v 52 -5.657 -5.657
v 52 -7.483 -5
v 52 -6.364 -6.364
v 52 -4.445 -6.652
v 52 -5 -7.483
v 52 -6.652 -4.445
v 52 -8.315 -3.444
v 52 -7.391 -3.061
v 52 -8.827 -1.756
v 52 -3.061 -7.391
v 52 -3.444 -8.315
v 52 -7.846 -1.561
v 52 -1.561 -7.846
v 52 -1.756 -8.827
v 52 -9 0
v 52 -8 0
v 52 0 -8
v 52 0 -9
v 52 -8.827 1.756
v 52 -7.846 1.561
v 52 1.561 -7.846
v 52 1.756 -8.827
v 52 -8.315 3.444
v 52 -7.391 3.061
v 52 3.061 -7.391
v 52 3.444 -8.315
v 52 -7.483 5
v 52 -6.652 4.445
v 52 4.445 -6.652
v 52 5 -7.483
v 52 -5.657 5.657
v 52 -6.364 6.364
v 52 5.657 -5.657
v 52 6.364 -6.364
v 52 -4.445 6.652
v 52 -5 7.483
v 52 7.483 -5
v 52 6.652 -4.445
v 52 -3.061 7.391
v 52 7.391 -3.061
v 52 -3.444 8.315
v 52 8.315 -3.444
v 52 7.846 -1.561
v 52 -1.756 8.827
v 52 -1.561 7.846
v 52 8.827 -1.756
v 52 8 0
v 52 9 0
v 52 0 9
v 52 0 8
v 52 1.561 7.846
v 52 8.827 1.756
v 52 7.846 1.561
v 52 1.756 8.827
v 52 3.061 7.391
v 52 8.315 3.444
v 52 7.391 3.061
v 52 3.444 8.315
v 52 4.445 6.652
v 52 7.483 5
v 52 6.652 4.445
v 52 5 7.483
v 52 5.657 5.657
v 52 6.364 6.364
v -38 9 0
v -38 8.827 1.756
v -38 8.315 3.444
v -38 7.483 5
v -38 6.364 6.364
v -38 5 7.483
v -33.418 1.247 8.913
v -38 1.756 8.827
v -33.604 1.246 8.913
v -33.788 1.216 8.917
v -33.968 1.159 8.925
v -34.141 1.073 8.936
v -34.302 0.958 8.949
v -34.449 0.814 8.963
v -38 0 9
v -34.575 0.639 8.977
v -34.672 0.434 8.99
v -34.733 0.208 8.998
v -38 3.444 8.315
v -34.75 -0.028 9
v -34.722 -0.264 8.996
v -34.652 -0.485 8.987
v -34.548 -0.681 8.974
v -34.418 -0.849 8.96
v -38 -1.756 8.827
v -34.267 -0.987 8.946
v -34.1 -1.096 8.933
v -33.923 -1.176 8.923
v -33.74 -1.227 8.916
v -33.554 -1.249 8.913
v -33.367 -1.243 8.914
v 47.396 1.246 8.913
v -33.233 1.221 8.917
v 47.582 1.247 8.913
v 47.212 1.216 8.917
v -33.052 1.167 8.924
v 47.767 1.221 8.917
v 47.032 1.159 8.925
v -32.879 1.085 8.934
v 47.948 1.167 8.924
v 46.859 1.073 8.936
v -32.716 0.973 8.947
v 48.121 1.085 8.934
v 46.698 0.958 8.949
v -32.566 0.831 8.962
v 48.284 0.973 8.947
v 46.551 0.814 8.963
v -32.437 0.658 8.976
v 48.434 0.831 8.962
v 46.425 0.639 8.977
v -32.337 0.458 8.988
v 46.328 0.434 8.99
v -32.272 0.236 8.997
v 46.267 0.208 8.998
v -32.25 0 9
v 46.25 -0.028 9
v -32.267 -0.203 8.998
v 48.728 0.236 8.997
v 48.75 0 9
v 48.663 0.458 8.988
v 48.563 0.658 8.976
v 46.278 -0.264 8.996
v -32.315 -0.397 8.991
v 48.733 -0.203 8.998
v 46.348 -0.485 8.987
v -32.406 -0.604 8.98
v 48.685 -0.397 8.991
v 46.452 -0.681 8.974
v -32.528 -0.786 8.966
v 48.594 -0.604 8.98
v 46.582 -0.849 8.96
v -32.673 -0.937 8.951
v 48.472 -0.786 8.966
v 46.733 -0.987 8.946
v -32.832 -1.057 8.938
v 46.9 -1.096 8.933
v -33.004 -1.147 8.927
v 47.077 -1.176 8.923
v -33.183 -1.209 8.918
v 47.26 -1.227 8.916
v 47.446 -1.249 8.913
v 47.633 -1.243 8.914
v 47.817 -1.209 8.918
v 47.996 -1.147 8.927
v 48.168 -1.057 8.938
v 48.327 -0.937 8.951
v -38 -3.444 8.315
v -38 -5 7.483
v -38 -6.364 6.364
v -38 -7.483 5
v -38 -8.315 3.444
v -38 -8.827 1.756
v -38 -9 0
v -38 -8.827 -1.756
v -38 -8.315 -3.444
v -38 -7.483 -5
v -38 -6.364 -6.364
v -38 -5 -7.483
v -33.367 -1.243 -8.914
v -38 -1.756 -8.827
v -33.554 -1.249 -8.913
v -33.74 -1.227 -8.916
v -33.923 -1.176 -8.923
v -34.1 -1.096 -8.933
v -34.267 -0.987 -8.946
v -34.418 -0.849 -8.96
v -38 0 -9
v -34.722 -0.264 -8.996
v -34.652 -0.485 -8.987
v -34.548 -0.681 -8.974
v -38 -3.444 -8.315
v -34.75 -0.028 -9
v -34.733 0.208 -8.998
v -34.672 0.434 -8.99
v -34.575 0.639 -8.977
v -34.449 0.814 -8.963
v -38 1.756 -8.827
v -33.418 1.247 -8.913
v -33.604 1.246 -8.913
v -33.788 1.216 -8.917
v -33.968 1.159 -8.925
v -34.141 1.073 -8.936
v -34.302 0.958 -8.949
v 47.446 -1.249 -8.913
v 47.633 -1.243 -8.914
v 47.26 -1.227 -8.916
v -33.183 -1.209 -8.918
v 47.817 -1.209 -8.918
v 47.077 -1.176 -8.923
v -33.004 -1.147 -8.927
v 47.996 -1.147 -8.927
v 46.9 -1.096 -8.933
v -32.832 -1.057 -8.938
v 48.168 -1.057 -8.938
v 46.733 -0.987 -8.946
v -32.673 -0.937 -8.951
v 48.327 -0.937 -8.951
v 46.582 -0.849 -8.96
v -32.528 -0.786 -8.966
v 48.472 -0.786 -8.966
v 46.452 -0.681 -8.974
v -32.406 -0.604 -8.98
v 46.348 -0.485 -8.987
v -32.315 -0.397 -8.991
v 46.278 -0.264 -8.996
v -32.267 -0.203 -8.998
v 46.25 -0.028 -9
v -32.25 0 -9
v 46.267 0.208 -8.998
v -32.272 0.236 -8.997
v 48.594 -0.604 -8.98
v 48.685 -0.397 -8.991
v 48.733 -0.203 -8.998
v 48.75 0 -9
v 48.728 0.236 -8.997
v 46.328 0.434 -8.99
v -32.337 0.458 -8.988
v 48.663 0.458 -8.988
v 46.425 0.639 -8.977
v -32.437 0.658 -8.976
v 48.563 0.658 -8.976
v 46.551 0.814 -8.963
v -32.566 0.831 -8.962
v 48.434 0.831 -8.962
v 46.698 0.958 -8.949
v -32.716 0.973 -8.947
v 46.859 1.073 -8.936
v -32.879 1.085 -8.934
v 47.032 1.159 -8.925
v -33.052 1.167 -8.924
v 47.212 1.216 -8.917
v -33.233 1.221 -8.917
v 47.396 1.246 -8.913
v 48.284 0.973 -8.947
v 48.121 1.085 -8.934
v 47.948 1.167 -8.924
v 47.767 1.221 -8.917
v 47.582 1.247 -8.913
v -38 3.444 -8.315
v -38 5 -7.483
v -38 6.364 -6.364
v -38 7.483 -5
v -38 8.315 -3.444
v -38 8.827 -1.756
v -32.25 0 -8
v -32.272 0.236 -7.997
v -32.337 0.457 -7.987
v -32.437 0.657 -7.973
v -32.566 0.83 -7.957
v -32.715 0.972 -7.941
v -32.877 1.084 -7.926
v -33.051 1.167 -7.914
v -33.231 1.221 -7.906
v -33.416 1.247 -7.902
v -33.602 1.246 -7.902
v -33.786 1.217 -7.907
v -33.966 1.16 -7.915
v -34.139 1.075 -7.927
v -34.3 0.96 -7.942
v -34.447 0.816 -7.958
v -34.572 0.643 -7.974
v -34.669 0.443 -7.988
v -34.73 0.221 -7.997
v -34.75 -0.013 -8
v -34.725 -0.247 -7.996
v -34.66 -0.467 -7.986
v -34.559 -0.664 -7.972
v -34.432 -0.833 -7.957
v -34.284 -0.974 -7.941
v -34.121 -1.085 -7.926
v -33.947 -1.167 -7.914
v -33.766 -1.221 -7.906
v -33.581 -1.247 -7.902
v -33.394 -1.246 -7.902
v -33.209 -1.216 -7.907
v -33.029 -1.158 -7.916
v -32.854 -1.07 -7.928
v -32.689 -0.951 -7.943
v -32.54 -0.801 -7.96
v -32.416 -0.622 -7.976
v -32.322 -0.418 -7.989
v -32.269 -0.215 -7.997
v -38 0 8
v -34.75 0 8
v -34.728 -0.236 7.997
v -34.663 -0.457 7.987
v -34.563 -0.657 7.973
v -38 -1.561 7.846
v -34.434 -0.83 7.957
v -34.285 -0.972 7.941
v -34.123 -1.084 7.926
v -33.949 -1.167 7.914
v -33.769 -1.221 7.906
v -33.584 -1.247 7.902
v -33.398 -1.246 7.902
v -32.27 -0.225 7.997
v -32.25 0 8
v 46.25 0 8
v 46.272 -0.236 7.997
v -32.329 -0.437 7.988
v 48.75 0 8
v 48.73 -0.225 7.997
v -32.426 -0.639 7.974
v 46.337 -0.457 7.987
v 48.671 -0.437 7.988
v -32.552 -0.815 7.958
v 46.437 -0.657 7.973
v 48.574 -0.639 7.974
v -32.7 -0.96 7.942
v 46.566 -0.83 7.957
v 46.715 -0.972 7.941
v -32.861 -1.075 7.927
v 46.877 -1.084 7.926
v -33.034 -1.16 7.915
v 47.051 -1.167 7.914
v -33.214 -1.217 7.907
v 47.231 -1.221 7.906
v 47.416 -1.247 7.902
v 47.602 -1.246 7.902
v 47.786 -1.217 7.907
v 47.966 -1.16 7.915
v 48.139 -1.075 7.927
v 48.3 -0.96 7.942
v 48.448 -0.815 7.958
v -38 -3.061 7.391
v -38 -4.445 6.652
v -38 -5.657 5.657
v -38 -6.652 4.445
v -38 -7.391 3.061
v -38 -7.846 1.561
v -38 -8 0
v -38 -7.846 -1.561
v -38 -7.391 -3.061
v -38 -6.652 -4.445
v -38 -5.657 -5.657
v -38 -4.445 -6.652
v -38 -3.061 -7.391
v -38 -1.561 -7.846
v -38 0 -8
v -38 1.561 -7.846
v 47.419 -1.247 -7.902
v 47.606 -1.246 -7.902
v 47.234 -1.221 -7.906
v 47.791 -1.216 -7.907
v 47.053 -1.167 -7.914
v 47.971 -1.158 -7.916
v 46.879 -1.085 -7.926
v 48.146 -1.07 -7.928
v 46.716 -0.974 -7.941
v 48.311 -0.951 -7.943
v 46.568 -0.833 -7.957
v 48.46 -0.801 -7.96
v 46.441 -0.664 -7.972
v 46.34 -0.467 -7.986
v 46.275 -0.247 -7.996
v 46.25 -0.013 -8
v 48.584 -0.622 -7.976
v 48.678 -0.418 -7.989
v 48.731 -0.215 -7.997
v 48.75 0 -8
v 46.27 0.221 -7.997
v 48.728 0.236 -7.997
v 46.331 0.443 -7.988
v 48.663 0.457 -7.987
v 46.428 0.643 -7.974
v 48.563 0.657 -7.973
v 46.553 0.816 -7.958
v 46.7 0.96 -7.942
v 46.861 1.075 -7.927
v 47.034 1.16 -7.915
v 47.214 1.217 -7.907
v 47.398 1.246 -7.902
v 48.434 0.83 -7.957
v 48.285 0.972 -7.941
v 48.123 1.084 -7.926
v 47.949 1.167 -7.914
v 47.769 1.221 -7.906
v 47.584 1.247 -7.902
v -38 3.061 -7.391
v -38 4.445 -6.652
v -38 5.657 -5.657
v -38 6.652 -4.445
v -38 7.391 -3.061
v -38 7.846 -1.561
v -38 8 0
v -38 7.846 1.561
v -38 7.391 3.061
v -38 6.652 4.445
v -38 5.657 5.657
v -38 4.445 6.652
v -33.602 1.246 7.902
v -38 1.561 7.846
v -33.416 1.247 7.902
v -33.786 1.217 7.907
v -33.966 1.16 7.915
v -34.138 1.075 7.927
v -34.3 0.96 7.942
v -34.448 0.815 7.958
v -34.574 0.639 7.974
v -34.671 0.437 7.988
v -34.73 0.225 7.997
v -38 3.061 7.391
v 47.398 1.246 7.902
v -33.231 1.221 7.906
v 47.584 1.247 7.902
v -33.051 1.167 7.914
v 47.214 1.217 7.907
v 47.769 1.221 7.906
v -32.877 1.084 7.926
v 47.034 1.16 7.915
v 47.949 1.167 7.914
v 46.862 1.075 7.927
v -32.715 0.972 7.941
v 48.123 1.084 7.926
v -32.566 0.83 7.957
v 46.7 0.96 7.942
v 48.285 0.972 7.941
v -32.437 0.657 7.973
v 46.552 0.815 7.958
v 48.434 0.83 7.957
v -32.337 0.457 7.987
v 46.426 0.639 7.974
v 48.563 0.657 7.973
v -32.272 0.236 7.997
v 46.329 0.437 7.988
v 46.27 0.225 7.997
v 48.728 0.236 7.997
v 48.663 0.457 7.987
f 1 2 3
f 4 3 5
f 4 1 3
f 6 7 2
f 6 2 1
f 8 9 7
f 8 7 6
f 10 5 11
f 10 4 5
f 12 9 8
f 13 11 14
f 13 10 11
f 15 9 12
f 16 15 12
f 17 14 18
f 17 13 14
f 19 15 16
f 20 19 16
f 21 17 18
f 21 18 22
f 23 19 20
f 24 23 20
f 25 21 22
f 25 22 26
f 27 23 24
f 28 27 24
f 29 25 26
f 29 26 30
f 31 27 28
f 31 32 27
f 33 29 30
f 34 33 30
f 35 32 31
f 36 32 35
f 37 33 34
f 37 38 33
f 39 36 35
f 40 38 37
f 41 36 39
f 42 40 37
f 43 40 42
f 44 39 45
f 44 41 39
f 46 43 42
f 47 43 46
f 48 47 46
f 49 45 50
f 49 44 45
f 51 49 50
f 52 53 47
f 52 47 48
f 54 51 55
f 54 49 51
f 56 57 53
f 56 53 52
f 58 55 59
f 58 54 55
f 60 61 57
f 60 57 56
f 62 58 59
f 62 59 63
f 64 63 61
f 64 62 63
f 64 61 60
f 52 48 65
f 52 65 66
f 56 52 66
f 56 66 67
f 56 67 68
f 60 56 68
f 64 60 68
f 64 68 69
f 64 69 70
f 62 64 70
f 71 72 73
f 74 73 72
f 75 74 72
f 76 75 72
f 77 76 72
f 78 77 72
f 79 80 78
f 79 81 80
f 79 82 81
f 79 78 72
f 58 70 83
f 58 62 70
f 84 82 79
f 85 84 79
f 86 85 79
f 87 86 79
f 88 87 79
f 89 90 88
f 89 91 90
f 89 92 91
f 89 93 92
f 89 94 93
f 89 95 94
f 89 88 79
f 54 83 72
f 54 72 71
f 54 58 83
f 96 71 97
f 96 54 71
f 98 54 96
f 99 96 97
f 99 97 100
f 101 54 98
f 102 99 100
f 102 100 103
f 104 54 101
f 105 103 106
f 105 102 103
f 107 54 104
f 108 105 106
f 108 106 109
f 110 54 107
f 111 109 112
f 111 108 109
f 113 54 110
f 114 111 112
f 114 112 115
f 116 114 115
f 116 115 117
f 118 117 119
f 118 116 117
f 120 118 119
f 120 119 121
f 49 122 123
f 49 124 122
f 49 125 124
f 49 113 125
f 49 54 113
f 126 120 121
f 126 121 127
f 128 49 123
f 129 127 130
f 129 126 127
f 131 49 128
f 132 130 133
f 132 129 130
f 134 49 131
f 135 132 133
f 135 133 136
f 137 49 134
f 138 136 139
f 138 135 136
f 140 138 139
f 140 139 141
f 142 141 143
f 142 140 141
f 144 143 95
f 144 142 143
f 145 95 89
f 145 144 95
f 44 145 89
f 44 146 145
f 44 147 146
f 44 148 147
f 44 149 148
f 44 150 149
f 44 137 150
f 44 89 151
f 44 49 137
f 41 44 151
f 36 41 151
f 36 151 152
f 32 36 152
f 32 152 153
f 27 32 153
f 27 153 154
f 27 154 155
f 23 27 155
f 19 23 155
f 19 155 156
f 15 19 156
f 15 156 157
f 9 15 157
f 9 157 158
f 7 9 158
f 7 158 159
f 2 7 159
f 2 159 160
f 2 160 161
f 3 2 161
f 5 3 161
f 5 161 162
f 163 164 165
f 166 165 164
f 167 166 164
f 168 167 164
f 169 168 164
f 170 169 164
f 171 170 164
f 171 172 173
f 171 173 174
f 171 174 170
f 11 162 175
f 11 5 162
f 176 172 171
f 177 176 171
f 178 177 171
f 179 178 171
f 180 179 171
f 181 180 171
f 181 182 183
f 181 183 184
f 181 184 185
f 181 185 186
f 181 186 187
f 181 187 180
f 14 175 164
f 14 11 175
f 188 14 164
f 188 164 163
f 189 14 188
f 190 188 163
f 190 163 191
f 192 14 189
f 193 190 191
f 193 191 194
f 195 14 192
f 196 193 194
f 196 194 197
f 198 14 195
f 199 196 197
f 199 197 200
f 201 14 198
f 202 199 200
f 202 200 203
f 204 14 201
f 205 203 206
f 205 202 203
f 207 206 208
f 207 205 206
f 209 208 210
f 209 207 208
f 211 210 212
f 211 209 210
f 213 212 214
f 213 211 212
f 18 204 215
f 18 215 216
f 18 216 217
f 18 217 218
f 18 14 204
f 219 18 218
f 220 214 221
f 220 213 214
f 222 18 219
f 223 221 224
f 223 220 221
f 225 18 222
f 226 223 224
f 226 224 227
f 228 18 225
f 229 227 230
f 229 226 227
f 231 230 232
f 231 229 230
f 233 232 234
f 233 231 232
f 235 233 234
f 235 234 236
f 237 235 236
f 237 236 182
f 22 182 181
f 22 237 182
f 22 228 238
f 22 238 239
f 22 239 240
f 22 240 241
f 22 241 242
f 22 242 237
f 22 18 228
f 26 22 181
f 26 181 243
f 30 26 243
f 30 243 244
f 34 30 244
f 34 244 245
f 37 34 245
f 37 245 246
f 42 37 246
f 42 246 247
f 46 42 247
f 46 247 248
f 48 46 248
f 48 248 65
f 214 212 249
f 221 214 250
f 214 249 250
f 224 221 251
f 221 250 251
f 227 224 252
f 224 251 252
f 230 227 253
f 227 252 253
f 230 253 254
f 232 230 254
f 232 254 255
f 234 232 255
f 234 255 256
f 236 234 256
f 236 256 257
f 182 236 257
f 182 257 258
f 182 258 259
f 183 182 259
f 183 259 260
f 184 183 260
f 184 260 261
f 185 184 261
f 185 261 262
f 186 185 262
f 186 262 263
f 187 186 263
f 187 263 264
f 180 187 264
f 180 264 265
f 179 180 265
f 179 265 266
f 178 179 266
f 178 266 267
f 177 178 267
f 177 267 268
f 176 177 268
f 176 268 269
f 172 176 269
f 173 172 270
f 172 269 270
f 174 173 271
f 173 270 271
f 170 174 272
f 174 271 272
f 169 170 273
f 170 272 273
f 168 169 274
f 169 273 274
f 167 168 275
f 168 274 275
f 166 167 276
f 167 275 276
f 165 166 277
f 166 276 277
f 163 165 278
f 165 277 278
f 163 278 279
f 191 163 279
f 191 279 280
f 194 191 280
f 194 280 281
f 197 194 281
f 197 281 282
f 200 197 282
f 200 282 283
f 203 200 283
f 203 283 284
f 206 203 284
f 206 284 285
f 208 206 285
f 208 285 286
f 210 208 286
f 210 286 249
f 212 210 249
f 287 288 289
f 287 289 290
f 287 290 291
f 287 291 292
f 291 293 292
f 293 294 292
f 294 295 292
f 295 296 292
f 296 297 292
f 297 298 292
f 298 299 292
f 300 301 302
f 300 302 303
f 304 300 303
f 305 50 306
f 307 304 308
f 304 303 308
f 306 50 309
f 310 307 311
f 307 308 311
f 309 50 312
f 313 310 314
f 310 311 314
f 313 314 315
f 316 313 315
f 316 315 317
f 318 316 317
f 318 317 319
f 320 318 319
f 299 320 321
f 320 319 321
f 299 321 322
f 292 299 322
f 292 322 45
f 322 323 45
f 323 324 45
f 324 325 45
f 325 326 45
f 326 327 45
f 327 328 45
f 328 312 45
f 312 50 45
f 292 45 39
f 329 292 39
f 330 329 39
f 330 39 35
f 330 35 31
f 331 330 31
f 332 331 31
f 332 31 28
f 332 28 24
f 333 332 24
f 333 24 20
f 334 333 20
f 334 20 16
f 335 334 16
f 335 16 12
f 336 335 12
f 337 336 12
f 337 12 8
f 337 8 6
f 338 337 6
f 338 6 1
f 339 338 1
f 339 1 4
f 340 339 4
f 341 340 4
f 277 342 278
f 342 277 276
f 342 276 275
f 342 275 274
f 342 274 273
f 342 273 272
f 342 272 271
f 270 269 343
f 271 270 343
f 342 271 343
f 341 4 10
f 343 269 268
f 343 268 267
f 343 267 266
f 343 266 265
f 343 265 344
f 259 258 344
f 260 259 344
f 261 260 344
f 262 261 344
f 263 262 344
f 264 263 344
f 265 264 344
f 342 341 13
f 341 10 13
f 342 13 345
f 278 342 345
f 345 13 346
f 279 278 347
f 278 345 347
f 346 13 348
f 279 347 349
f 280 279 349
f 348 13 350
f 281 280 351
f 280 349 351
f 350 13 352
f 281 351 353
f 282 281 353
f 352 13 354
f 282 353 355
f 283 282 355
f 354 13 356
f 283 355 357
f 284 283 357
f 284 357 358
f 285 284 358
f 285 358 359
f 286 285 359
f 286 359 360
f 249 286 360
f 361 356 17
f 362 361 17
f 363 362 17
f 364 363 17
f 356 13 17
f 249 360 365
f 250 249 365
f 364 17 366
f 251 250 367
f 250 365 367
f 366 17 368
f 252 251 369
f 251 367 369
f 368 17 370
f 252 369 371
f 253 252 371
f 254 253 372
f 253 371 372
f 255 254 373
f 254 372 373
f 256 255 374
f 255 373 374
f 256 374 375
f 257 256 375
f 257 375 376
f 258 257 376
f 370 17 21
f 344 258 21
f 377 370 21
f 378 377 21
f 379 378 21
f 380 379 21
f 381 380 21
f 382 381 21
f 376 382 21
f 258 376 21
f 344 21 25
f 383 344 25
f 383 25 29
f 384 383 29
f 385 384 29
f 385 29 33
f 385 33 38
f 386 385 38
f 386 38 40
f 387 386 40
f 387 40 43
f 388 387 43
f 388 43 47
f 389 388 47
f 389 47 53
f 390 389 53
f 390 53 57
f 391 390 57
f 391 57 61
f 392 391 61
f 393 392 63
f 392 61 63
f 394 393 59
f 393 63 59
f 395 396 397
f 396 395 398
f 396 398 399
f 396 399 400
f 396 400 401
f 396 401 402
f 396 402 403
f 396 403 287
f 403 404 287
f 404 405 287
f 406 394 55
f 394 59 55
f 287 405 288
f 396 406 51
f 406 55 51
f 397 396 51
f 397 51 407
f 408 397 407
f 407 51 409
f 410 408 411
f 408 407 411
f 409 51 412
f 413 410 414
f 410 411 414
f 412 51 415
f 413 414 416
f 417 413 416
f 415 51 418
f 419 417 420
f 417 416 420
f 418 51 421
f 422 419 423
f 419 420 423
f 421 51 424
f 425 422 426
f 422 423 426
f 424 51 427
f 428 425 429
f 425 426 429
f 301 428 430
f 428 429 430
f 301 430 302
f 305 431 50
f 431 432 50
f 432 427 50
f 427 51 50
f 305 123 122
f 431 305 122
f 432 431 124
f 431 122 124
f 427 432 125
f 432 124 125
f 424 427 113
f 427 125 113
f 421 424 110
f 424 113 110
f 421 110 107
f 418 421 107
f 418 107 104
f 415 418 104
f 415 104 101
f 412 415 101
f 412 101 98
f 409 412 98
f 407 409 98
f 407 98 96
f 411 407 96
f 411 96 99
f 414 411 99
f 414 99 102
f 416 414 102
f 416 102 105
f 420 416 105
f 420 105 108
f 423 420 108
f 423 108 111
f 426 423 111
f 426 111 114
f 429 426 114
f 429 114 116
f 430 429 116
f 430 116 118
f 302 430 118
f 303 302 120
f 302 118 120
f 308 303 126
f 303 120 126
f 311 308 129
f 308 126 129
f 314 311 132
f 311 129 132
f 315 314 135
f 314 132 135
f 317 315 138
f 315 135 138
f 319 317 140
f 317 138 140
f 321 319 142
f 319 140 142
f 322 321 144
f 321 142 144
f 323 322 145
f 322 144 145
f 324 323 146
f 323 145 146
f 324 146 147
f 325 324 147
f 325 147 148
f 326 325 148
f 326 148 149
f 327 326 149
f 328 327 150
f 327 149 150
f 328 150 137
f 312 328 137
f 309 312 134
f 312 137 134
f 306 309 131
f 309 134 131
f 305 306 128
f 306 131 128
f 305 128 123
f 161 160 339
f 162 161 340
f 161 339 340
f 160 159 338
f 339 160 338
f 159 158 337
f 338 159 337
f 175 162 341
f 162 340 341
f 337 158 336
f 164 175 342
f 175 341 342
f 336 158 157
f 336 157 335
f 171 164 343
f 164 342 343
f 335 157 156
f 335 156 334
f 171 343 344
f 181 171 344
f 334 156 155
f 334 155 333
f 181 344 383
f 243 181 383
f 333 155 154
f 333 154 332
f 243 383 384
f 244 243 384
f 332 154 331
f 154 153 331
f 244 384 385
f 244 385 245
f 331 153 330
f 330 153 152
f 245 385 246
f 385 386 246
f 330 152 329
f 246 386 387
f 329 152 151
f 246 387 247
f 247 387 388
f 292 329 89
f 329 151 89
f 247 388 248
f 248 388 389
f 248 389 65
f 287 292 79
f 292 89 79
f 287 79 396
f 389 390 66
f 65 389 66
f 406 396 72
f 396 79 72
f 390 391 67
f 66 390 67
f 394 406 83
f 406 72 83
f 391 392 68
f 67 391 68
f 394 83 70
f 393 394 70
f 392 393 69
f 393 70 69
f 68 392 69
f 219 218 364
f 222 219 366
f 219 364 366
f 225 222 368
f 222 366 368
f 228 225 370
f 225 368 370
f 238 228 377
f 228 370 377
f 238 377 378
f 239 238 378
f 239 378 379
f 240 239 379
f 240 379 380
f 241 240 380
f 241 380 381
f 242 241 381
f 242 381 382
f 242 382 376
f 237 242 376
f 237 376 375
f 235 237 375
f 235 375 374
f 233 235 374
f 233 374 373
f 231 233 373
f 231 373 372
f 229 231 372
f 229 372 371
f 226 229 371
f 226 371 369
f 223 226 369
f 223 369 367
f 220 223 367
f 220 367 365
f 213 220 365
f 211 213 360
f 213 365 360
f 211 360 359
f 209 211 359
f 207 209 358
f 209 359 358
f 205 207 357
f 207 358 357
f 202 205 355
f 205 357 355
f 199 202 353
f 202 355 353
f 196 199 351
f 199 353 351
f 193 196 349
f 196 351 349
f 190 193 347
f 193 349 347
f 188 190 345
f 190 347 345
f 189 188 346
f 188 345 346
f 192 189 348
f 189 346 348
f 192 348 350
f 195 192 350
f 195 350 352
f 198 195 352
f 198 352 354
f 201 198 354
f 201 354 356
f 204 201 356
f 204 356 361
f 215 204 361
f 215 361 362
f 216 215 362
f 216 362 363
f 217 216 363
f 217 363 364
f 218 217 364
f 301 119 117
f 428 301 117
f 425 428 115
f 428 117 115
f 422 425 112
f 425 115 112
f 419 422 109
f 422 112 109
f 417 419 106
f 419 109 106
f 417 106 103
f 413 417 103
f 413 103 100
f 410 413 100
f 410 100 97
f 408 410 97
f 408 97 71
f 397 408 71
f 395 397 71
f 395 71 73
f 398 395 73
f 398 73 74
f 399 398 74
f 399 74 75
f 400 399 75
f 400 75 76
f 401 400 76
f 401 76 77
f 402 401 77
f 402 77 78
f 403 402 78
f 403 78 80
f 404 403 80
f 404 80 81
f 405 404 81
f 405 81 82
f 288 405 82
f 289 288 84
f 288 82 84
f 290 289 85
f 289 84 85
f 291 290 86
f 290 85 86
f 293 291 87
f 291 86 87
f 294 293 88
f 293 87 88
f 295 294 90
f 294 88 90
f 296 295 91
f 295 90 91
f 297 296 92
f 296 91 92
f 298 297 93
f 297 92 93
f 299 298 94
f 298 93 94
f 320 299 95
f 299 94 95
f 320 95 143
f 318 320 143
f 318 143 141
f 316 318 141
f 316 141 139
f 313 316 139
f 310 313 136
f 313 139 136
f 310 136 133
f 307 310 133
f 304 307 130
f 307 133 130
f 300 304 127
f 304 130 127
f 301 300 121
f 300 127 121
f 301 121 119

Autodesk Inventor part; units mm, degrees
ref_plane "YZ Plane" through (0, 0, 0) normal (1, 0, 0) x (0, 1, 0)
ref_plane "XZ Plane" through (0, 0, 0) normal (0, 1, 0) x (-1, 0, 0)
sketch "ShaftProfile" plane through (0, 0, 0) normal (0, 0, 1) x (1, 0, 0)
  line L0 (-56, 0) -> (70, 0) construction
  line L1 (-38, 9) -> (52, 9)
  line L2 (52, 9) -> (52, 0)
  line L3 (-38, 0) -> (-38, 9)
  line L4 (-38, 0) -> (52, 0)
  point P0 (0, 0)
  dimension "d1" = 90
  dimension "d2" = 9
  dimension "d4" = 38
revolve "ShaftFeature" add sketch "ShaftProfile" angle 360 about axis through (-38, 0, 0) along (1, 0, 0)
sketch "Sketch2" plane through (-38, 0, 0) normal (-1, 0, 0) x (0, 0, 1)
  circle A0 centre (0, 0) radius 9 projected
hole "ShaftHoleFeature" at (-38, 0, 0) direction (1, 0, 0) diameter 16 end through all
ref_plane "MidSidePlane" through (0, 0, 10) normal (0, 0, 1) x (1, 0, 0)
sketch "CapHoles" plane through (0, 0, 10) normal (0, 0, 1) x (1, 0, 0)
  line L0 (52, -9) -> (52, 9) construction
  line L1 (-38, -9) -> (-38, 9) construction
  line L2 (-52, 0) -> (46, 0) construction
  circle A0 centre (-33.5, 0) radius 1.25
  circle A1 centre (47.5, 0) radius 1.25
  dimension "d24" = 2.5
  dimension "d25" = 4.5
  dimension "d26" = 4.5
extrude "CapHolesFeature" cut sketch "CapHoles" against normal through all
equation "\"d26\" = d25"
properties part number "BackPair1PistonShaft"
